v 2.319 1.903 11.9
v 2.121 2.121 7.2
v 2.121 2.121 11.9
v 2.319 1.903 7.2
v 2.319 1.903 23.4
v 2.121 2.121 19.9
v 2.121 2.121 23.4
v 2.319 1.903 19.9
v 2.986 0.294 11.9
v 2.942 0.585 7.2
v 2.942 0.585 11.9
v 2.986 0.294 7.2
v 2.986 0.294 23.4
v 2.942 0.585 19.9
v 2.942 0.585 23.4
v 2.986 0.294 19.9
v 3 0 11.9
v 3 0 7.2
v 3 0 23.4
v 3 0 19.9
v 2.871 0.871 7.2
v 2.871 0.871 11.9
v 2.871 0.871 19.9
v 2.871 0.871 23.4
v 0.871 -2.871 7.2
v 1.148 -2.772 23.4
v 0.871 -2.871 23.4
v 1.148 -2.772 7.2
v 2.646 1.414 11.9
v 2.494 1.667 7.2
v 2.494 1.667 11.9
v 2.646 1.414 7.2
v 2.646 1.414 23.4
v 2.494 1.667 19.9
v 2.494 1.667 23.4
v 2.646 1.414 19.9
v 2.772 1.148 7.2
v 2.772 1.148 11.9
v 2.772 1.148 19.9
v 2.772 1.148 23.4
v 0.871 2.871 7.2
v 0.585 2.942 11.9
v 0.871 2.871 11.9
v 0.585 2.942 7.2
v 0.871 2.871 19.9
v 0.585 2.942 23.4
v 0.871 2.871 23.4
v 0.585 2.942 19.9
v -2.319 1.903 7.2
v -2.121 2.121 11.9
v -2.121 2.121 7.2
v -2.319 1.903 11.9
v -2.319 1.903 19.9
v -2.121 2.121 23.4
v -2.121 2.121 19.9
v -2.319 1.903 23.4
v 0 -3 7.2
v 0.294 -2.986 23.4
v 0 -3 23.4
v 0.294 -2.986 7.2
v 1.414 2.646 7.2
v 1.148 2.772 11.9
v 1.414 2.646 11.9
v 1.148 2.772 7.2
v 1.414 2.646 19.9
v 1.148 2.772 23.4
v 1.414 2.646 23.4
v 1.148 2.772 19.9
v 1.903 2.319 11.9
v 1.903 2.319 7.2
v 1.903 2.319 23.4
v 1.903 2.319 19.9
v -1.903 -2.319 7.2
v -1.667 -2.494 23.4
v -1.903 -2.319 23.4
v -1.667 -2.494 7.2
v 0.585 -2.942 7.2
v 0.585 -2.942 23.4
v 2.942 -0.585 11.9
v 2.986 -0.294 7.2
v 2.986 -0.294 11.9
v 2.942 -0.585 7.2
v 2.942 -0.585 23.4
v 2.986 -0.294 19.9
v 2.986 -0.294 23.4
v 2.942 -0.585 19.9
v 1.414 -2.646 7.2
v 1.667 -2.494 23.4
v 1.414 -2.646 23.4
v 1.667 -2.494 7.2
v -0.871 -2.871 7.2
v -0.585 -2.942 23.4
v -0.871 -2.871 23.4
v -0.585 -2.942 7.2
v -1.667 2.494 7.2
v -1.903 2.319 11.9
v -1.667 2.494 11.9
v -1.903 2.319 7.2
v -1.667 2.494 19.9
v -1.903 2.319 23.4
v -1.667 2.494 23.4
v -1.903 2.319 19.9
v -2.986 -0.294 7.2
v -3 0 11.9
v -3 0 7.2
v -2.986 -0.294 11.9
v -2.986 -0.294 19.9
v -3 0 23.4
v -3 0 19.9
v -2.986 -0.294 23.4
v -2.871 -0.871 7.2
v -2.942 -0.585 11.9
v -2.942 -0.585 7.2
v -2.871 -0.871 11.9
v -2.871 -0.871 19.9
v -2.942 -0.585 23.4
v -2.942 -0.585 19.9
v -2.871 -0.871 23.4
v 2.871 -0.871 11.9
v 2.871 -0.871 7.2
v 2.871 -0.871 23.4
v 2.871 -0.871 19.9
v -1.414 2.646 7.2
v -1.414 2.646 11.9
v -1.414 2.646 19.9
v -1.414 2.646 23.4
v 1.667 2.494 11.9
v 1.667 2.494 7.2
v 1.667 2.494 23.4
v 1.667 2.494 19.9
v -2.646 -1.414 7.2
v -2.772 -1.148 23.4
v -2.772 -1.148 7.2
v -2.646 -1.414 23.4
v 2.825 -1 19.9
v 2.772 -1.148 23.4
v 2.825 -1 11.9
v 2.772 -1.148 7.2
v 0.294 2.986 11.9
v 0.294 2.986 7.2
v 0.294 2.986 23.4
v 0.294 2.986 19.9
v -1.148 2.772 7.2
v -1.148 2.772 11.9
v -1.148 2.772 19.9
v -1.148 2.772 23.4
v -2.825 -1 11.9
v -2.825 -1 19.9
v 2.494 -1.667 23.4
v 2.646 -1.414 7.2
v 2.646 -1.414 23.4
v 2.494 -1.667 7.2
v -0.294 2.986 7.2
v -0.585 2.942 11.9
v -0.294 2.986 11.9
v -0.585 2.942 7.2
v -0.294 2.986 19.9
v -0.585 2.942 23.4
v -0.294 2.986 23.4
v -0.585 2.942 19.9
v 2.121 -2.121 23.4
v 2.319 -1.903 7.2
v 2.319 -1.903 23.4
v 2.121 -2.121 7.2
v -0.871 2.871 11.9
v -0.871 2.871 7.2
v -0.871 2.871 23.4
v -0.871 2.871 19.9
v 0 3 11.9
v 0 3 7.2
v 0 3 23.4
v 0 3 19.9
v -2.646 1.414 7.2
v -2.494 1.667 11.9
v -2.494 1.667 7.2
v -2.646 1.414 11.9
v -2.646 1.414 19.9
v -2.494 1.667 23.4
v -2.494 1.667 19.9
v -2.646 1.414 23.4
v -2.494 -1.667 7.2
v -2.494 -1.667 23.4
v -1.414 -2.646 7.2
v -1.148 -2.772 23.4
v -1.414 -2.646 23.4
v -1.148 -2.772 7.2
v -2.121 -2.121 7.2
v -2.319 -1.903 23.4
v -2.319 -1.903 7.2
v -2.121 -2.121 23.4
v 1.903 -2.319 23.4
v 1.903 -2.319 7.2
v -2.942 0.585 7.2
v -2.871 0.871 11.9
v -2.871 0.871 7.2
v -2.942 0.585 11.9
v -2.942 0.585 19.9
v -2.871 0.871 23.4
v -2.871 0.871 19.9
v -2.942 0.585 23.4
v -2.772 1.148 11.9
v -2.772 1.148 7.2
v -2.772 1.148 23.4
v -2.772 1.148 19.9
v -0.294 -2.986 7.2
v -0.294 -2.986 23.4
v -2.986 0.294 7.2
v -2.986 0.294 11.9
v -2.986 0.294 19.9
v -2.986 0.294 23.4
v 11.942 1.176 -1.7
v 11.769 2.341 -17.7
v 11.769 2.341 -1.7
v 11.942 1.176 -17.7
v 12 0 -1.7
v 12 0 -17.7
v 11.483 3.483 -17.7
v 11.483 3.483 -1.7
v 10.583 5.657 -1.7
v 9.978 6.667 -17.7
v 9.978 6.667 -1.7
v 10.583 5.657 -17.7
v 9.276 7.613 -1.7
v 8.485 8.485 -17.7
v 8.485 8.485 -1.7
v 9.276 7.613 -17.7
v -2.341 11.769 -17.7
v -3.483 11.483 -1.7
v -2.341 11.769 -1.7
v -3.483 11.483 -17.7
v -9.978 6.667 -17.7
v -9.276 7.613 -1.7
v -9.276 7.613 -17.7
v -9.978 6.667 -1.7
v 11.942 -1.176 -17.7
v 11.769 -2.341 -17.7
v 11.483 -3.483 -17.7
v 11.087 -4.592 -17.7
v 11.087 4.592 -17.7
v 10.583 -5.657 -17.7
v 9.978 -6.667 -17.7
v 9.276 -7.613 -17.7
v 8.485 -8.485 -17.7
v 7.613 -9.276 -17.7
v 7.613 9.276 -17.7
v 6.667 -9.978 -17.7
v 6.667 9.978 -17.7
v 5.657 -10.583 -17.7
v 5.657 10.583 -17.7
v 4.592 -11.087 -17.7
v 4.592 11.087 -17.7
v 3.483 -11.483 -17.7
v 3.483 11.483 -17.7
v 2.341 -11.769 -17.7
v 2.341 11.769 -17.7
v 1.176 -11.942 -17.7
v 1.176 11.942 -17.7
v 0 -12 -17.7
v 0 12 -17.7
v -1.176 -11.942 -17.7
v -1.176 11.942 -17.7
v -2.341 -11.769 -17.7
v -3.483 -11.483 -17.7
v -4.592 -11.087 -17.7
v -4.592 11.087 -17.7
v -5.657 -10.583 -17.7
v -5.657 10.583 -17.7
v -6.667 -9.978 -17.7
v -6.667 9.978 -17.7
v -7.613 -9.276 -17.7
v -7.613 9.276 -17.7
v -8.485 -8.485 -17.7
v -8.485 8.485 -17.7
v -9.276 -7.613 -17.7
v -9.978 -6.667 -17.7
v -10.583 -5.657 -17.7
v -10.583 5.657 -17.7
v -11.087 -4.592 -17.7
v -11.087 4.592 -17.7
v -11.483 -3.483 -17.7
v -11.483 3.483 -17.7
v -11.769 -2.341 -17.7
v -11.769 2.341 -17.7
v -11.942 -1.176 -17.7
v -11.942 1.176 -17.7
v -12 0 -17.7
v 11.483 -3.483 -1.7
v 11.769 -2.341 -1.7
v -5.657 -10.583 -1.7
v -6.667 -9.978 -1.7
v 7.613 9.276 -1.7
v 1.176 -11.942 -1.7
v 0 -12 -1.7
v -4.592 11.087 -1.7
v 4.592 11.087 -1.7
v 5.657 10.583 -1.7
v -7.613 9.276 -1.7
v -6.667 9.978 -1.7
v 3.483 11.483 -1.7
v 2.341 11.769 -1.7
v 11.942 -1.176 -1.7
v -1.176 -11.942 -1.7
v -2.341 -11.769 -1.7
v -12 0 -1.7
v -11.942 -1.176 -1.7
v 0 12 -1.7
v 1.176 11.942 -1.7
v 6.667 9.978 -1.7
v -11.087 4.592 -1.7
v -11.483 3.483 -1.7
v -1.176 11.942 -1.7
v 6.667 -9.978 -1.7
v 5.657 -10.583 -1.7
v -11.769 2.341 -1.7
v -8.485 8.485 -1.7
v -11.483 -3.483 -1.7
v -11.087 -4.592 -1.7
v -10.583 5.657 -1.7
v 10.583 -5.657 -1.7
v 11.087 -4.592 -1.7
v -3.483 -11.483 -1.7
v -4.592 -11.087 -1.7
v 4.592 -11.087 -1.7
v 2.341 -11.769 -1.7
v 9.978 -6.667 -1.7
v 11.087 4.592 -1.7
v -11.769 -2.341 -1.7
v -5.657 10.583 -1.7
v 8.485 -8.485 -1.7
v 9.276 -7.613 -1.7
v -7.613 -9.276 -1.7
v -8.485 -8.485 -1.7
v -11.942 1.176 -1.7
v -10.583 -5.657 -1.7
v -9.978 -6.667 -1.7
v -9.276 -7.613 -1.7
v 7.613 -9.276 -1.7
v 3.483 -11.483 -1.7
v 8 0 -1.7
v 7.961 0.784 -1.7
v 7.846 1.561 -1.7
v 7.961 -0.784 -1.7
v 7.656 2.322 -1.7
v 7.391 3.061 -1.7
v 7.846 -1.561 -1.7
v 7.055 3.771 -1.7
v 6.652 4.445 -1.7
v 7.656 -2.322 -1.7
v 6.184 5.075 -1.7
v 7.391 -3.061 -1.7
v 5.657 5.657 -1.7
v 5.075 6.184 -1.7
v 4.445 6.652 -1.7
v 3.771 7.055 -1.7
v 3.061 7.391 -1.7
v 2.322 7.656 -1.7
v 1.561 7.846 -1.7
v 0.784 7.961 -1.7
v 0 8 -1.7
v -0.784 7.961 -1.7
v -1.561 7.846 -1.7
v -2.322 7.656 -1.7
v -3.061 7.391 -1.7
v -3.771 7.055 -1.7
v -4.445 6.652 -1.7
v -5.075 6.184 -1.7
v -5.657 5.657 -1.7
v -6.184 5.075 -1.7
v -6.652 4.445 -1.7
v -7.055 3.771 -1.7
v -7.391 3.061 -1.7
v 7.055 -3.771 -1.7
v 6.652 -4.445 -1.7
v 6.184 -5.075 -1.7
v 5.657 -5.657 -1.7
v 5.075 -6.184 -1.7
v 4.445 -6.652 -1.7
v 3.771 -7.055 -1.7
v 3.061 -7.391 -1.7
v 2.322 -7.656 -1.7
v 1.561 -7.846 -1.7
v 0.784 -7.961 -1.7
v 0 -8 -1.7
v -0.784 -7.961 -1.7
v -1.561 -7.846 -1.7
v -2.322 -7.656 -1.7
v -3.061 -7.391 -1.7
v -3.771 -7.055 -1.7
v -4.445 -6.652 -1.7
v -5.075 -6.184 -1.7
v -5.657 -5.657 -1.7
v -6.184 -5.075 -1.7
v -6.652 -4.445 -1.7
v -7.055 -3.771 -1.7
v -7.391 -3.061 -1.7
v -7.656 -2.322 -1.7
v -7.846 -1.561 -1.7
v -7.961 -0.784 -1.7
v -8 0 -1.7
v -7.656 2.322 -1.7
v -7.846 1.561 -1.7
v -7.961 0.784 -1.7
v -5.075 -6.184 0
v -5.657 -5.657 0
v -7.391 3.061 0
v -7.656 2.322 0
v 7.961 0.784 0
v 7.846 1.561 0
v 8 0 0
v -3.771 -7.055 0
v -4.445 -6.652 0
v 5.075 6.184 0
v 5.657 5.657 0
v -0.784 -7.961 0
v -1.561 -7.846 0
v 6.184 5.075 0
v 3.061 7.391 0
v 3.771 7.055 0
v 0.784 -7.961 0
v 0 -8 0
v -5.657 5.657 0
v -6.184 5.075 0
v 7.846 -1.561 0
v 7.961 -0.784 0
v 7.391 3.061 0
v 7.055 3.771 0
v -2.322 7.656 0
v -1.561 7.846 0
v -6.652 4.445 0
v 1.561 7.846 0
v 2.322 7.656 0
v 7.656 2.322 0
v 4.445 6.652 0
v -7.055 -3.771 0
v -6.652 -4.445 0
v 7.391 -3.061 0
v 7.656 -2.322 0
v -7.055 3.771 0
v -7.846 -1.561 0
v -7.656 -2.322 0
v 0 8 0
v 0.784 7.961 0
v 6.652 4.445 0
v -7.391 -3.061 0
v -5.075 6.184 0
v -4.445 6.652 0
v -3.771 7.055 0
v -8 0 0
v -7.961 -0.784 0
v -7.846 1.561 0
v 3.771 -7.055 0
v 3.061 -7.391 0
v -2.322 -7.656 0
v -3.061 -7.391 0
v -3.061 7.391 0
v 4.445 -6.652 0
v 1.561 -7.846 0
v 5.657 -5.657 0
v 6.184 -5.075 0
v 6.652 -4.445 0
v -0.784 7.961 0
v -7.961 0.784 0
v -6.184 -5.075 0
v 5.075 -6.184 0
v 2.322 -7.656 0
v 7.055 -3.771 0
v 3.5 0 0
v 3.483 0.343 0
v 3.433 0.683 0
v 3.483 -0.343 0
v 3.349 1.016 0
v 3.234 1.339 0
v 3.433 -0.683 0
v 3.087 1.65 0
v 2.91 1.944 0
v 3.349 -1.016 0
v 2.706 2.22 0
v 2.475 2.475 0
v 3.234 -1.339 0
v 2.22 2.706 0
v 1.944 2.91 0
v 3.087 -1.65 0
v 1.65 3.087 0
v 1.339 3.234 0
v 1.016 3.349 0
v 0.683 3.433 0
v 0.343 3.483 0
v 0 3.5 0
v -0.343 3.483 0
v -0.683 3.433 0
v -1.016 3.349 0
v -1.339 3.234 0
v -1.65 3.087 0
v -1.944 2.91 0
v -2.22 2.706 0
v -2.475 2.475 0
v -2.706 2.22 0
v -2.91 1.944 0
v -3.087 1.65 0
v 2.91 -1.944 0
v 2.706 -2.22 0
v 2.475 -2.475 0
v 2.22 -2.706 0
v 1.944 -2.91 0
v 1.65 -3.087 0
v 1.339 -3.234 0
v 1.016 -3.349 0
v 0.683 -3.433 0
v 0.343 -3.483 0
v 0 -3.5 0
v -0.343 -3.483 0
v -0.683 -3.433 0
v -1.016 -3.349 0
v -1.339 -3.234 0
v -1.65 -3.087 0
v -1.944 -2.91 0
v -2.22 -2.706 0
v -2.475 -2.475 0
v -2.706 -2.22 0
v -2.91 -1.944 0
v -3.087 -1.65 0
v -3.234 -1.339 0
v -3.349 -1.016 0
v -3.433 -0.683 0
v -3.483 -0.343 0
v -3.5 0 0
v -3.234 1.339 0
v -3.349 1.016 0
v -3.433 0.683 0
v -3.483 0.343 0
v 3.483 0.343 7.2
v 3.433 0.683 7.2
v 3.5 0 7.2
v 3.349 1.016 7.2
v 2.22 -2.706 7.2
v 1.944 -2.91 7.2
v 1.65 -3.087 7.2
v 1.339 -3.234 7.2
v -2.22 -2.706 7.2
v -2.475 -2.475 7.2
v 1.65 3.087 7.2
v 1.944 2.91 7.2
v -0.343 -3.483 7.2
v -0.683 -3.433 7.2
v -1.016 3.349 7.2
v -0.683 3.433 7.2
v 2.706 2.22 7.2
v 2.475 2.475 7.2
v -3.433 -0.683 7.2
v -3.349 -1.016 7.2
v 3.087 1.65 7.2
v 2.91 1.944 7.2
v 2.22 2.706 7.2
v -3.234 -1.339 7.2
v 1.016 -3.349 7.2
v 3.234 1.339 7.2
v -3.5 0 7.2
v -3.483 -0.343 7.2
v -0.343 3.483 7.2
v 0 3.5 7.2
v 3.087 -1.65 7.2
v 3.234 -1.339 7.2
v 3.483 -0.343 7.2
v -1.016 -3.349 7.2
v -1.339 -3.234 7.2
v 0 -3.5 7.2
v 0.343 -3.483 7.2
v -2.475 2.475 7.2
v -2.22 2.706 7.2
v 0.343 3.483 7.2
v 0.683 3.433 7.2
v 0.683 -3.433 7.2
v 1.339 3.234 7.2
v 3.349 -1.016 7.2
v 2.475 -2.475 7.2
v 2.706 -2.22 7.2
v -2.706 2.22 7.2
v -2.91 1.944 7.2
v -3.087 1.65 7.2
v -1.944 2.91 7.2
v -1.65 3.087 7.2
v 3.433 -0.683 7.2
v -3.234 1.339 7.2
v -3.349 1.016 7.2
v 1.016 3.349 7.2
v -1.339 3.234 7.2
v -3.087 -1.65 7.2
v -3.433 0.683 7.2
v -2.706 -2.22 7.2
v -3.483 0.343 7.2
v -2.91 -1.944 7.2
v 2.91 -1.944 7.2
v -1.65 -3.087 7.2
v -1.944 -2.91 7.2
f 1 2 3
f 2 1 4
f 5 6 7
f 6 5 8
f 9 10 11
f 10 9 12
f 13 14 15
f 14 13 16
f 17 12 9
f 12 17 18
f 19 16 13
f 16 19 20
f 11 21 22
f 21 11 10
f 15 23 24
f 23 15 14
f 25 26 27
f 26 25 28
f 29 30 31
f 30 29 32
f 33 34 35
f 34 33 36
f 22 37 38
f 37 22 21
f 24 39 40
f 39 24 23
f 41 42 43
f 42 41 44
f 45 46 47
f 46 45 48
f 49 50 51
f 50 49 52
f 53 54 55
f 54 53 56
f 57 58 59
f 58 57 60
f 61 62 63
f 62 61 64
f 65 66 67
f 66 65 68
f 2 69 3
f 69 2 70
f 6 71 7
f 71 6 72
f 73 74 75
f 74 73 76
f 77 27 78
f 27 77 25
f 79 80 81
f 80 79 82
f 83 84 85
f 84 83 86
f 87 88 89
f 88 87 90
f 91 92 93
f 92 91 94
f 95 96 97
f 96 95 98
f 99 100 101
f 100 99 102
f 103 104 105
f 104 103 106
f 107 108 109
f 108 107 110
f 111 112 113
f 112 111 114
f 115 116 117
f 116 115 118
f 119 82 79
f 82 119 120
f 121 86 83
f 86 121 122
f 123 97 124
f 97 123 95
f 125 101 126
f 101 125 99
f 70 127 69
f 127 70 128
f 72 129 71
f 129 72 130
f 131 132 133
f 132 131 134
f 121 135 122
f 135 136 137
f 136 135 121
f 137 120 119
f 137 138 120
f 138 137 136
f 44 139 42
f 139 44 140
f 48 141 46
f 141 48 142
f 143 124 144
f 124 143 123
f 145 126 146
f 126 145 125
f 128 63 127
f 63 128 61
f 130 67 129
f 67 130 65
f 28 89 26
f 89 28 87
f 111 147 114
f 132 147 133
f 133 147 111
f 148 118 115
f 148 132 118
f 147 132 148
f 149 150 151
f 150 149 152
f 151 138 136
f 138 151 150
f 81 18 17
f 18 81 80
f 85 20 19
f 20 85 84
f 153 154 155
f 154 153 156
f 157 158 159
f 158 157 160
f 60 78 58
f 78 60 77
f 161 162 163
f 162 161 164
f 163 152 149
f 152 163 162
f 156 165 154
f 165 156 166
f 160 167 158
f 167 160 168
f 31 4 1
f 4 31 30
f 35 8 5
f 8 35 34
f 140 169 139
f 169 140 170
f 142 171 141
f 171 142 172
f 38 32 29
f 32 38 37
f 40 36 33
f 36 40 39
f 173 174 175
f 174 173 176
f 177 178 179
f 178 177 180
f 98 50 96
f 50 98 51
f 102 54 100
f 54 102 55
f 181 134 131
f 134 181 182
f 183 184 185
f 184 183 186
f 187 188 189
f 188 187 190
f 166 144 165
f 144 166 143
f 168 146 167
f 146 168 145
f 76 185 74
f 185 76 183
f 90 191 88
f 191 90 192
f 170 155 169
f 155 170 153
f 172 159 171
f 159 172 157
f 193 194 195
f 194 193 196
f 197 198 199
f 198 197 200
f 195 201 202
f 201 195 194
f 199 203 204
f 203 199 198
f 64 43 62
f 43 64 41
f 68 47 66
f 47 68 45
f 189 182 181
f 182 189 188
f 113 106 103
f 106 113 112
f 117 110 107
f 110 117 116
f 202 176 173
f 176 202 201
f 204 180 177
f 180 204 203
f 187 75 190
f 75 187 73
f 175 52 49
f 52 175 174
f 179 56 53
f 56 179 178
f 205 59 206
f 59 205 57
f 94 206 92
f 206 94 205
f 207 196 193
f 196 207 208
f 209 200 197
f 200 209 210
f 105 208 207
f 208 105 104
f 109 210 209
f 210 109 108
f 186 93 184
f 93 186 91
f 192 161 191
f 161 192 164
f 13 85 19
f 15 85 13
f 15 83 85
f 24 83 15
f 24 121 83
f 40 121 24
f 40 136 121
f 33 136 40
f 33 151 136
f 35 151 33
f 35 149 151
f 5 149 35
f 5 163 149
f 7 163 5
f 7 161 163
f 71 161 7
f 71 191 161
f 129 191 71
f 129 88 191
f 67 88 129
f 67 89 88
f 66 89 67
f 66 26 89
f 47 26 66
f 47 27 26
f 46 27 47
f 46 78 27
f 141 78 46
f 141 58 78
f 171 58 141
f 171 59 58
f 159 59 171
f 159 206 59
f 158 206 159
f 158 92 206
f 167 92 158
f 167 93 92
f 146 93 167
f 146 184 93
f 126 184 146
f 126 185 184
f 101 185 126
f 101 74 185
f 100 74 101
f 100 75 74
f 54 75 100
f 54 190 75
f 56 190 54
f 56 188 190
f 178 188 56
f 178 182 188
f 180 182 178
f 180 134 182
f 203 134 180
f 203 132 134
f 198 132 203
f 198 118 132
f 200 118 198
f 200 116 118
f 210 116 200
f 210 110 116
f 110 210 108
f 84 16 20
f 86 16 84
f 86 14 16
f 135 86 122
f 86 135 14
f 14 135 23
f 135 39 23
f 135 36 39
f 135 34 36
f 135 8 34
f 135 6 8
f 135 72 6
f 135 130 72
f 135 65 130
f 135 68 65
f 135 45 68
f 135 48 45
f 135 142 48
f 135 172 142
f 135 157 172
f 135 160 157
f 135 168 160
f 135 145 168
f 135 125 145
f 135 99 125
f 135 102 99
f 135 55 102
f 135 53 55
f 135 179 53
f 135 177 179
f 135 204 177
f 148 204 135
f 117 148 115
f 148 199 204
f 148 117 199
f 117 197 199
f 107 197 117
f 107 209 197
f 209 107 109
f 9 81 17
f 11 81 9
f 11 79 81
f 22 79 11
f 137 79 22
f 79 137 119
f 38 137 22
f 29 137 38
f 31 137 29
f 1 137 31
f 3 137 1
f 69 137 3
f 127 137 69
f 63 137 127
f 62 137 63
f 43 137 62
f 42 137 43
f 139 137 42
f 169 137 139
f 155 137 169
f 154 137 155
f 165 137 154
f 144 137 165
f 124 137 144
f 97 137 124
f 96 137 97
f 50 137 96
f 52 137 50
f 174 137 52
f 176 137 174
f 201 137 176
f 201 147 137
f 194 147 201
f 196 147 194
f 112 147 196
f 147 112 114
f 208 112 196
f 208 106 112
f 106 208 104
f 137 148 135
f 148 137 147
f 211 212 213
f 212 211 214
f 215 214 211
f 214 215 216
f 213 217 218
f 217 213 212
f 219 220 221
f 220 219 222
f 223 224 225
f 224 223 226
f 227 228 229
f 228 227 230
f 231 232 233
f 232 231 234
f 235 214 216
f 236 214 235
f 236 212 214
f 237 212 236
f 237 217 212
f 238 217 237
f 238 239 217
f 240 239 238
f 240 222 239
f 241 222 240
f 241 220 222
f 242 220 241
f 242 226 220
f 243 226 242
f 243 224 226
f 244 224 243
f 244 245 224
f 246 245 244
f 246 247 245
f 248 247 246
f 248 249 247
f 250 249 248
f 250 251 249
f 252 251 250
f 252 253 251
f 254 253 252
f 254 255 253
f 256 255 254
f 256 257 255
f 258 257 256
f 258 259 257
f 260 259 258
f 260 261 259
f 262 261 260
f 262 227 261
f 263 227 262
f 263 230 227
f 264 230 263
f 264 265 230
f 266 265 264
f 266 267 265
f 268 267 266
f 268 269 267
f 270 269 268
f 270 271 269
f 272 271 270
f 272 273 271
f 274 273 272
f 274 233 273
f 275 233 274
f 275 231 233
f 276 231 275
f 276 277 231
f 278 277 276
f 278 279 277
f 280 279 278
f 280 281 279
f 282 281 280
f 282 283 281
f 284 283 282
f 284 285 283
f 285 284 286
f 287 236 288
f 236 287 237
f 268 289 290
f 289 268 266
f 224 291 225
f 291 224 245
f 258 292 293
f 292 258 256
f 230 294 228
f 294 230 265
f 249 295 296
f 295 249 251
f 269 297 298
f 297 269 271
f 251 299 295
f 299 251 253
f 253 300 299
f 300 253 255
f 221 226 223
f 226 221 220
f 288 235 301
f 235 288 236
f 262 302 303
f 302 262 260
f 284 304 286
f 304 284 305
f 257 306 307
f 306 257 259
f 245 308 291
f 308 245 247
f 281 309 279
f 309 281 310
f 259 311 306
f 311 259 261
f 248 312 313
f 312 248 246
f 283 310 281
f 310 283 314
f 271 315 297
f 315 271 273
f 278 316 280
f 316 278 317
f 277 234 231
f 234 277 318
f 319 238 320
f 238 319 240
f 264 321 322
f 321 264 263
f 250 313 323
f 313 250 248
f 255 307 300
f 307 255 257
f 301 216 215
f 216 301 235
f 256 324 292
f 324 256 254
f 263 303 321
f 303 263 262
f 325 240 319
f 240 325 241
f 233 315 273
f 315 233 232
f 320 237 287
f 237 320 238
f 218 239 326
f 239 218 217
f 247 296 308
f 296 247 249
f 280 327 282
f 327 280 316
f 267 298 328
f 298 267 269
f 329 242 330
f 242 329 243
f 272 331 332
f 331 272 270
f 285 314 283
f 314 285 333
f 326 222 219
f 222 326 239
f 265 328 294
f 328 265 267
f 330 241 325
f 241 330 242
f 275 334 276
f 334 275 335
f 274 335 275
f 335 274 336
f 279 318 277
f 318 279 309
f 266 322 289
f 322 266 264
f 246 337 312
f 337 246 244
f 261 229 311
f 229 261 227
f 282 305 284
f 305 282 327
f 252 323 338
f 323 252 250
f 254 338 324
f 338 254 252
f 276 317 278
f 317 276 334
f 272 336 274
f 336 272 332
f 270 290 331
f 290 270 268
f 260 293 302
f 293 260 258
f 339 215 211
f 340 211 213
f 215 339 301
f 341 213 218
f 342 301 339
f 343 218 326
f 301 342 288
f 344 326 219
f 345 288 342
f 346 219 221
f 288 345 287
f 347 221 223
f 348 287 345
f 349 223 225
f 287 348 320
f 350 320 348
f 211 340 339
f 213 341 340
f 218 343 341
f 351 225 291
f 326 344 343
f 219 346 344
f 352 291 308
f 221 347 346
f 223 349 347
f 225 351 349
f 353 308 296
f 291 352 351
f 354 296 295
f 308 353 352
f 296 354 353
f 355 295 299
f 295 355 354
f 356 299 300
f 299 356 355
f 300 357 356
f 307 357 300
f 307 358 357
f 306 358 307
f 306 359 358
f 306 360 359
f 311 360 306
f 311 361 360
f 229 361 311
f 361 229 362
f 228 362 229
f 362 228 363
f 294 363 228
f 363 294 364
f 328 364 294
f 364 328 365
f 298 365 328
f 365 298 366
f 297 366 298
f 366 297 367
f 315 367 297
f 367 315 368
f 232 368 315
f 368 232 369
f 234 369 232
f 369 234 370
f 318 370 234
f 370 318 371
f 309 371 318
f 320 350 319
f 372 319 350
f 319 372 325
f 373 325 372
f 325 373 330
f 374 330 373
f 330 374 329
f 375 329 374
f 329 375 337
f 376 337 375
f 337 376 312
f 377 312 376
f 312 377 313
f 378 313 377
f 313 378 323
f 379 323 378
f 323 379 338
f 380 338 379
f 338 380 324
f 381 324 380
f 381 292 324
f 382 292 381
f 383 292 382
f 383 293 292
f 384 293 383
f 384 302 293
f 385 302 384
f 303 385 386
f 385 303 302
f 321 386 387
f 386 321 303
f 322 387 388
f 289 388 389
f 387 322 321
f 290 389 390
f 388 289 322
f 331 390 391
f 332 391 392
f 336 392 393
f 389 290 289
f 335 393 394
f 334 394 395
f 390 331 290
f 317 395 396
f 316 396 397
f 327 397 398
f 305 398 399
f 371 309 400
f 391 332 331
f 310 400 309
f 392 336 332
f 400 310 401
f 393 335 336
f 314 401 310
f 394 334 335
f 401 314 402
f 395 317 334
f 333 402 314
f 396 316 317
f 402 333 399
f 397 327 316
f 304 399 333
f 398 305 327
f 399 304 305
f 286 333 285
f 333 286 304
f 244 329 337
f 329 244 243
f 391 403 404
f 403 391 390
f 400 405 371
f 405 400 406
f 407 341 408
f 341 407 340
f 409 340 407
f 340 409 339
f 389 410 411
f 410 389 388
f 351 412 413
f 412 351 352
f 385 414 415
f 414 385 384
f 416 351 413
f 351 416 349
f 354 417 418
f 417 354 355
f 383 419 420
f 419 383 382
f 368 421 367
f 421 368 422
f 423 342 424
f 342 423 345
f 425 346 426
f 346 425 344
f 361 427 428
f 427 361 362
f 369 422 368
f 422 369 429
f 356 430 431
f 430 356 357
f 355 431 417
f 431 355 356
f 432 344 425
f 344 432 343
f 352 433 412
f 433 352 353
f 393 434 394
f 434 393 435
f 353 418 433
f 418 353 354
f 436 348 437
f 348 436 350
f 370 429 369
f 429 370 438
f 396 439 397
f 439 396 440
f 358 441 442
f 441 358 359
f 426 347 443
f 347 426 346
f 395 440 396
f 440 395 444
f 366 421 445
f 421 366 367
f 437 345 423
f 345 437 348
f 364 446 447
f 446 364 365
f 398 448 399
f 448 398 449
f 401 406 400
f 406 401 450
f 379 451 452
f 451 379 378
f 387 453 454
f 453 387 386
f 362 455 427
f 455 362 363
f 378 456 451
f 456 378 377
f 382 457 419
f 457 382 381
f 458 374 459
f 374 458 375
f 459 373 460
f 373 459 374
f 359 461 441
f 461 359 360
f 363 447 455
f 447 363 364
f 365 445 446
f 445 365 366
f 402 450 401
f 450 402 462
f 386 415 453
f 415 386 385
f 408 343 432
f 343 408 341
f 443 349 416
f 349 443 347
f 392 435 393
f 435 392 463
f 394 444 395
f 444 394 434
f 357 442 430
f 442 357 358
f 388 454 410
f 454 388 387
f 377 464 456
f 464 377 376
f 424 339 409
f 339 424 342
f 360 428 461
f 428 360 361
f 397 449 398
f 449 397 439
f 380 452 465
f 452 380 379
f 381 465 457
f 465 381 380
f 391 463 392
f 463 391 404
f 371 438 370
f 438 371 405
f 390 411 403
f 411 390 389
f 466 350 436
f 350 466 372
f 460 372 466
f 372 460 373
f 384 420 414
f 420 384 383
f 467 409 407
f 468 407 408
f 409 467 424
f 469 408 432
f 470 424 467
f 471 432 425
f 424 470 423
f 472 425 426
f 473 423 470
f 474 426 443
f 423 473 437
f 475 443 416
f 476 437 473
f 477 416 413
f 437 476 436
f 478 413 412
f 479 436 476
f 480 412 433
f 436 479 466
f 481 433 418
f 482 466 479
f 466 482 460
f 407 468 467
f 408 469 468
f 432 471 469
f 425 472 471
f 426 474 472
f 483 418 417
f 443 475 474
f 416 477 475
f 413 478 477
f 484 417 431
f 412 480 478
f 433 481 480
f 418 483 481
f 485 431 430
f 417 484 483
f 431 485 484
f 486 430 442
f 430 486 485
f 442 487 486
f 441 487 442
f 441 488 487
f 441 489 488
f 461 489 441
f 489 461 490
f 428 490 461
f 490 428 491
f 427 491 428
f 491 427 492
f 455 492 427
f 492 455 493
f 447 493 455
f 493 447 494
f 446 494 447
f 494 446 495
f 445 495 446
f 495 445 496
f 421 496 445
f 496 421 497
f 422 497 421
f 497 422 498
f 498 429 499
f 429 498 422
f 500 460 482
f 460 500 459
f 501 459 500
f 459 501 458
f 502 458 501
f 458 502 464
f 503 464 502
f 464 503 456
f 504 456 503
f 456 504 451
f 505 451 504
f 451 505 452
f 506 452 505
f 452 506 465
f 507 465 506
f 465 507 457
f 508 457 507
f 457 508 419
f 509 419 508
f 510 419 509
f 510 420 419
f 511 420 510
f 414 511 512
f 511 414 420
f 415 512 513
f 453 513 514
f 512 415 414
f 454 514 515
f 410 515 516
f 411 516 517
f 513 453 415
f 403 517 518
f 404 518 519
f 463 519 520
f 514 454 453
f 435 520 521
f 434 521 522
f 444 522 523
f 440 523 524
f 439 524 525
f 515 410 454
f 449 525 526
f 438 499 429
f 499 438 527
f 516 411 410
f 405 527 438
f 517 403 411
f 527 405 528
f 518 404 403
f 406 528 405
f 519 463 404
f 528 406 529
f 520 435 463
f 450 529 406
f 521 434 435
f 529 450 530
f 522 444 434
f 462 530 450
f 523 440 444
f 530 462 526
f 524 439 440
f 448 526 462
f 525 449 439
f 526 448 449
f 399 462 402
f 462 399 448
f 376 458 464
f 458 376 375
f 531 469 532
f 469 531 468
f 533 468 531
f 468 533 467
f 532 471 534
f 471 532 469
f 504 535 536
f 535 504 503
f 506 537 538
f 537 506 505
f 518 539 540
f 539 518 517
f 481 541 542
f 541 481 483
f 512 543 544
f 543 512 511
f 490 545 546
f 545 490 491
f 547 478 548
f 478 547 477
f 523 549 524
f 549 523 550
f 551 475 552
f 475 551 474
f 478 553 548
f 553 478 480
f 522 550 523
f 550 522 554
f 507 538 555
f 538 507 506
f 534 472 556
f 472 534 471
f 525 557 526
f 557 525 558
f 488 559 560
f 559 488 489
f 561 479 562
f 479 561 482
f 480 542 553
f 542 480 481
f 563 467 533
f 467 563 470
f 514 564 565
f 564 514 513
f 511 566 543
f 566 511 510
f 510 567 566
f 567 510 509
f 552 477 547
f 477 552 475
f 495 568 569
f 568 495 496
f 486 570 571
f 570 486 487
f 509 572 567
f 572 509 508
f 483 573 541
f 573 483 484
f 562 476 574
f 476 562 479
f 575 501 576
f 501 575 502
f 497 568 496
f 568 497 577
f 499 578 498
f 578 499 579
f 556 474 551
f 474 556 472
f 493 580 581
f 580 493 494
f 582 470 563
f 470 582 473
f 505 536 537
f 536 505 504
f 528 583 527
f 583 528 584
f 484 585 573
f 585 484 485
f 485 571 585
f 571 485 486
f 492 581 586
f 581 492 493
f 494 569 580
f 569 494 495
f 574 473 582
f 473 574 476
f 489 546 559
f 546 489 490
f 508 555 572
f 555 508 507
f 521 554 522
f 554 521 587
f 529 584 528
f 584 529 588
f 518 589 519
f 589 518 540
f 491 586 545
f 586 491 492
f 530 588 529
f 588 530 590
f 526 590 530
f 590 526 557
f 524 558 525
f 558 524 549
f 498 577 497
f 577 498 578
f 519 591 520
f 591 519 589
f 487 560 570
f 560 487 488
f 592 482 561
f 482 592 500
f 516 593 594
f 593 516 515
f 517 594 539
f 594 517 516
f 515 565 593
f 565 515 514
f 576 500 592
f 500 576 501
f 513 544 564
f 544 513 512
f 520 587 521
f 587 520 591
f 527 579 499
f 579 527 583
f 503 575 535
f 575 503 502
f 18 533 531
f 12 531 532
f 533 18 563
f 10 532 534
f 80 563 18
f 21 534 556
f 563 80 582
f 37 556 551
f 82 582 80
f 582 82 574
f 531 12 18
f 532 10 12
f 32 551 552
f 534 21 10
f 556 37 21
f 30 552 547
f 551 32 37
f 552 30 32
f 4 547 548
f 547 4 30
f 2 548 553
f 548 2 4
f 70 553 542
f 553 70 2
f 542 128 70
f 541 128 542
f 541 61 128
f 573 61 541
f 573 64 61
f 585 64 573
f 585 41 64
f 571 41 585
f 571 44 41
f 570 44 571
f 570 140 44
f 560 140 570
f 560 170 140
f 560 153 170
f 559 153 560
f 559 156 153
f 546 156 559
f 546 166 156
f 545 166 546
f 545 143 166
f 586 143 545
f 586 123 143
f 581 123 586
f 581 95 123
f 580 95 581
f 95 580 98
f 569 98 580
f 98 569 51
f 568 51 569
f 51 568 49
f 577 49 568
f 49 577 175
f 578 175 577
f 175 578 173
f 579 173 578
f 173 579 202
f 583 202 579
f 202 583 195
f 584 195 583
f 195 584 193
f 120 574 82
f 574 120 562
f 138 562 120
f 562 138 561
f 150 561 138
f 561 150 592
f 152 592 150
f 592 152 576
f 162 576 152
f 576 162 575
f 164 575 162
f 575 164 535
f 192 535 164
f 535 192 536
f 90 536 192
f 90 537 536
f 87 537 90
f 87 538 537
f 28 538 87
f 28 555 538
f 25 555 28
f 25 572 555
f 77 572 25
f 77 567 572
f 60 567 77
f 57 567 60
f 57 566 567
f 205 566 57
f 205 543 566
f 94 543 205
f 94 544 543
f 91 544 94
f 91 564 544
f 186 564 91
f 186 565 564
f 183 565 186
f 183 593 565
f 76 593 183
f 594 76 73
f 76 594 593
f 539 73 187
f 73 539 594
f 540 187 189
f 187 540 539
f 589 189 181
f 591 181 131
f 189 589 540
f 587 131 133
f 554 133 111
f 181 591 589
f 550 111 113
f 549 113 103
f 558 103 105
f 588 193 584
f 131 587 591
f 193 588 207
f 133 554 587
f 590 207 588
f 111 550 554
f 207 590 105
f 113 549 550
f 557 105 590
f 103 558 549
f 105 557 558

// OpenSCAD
// Parameters
type_vector_0 = 12; //[6:24:1]
type_vector_1 = 11; //[5.5:22:0.5]
type_vector_2 = 6; //[3:12:0.5]
type_vector_3 = 0.5; //[0.25:1:0.05]
thickness = 3; //[1.5:6:0.5]
shaft_length = 15; //[7.5:30:0.5]
value_flag = 0; //[0:1:1]
eps = 0.8; //[0.5:2:0.1]
panel_clearance = 0.5; //[0.2:1.5:0.1]
pot_body_d = 24; //[12:48:1]
pot_body_h = 16; //[8:32:1]
boss_d = 16; //[8:32:0.5]
boss_h = 2.5; //[1.25:5:0.25]
thread_d = 7; //[3.5:14:0.25]
thread_h = 8; //[4:16:0.5]
shaft_d = 6; //[3:12:0.5]
shaft_neck_d = 6; //[3:12:0.5]
shaft_neck_h = 2; //[0:6:0.5]
shaft_flat_depth = 1; //[0:3:0.25]
shaft_flat_h = 8; //[0:20:0.5]

// Potentiometer - complete geometry
module potentiometer() {
  color("DimGray") {
    // Potentiometer Body
    translate([0, 0, -(pot_body_h/2 + boss_h - eps)])
      cylinder(r=pot_body_d/2, h=pot_body_h, center=true, $fn=64);
    
    // Mounting Boss
    translate([0, 0, -boss_h/2])
      cylinder(r=boss_d/2, h=boss_h, center=true, $fn=64);
    
    // Threaded Bushing
    translate([0, 0, thread_h/2 - eps])
      cylinder(r=thread_d/2, h=thread_h, center=true, $fn=64);
    
    // Shaft Neck
    translate([0, 0, thread_h - eps + shaft_neck_h/2])
      cylinder(r=shaft_neck_d/2, h=shaft_neck_h, center=true, $fn=64);
    
    // Shaft Main
    difference() {
      translate([0, 0, thread_h - eps + shaft_neck_h - eps + shaft_length/2])
        cylinder(r=shaft_d/2, h=shaft_length, center=true, $fn=64);
      
      // Shaft Flat Cutter
      translate([0, (shaft_d/2 - shaft_flat_depth), thread_h - eps + shaft_neck_h - eps + (shaft_length - shaft_flat_h)/2 + shaft_flat_h/2])
        cube([shaft_d*2, shaft_d, shaft_flat_h], center=true);
    }
  }
}

// Assembly
module assembly() {
  potentiometer();
}

assembly();
